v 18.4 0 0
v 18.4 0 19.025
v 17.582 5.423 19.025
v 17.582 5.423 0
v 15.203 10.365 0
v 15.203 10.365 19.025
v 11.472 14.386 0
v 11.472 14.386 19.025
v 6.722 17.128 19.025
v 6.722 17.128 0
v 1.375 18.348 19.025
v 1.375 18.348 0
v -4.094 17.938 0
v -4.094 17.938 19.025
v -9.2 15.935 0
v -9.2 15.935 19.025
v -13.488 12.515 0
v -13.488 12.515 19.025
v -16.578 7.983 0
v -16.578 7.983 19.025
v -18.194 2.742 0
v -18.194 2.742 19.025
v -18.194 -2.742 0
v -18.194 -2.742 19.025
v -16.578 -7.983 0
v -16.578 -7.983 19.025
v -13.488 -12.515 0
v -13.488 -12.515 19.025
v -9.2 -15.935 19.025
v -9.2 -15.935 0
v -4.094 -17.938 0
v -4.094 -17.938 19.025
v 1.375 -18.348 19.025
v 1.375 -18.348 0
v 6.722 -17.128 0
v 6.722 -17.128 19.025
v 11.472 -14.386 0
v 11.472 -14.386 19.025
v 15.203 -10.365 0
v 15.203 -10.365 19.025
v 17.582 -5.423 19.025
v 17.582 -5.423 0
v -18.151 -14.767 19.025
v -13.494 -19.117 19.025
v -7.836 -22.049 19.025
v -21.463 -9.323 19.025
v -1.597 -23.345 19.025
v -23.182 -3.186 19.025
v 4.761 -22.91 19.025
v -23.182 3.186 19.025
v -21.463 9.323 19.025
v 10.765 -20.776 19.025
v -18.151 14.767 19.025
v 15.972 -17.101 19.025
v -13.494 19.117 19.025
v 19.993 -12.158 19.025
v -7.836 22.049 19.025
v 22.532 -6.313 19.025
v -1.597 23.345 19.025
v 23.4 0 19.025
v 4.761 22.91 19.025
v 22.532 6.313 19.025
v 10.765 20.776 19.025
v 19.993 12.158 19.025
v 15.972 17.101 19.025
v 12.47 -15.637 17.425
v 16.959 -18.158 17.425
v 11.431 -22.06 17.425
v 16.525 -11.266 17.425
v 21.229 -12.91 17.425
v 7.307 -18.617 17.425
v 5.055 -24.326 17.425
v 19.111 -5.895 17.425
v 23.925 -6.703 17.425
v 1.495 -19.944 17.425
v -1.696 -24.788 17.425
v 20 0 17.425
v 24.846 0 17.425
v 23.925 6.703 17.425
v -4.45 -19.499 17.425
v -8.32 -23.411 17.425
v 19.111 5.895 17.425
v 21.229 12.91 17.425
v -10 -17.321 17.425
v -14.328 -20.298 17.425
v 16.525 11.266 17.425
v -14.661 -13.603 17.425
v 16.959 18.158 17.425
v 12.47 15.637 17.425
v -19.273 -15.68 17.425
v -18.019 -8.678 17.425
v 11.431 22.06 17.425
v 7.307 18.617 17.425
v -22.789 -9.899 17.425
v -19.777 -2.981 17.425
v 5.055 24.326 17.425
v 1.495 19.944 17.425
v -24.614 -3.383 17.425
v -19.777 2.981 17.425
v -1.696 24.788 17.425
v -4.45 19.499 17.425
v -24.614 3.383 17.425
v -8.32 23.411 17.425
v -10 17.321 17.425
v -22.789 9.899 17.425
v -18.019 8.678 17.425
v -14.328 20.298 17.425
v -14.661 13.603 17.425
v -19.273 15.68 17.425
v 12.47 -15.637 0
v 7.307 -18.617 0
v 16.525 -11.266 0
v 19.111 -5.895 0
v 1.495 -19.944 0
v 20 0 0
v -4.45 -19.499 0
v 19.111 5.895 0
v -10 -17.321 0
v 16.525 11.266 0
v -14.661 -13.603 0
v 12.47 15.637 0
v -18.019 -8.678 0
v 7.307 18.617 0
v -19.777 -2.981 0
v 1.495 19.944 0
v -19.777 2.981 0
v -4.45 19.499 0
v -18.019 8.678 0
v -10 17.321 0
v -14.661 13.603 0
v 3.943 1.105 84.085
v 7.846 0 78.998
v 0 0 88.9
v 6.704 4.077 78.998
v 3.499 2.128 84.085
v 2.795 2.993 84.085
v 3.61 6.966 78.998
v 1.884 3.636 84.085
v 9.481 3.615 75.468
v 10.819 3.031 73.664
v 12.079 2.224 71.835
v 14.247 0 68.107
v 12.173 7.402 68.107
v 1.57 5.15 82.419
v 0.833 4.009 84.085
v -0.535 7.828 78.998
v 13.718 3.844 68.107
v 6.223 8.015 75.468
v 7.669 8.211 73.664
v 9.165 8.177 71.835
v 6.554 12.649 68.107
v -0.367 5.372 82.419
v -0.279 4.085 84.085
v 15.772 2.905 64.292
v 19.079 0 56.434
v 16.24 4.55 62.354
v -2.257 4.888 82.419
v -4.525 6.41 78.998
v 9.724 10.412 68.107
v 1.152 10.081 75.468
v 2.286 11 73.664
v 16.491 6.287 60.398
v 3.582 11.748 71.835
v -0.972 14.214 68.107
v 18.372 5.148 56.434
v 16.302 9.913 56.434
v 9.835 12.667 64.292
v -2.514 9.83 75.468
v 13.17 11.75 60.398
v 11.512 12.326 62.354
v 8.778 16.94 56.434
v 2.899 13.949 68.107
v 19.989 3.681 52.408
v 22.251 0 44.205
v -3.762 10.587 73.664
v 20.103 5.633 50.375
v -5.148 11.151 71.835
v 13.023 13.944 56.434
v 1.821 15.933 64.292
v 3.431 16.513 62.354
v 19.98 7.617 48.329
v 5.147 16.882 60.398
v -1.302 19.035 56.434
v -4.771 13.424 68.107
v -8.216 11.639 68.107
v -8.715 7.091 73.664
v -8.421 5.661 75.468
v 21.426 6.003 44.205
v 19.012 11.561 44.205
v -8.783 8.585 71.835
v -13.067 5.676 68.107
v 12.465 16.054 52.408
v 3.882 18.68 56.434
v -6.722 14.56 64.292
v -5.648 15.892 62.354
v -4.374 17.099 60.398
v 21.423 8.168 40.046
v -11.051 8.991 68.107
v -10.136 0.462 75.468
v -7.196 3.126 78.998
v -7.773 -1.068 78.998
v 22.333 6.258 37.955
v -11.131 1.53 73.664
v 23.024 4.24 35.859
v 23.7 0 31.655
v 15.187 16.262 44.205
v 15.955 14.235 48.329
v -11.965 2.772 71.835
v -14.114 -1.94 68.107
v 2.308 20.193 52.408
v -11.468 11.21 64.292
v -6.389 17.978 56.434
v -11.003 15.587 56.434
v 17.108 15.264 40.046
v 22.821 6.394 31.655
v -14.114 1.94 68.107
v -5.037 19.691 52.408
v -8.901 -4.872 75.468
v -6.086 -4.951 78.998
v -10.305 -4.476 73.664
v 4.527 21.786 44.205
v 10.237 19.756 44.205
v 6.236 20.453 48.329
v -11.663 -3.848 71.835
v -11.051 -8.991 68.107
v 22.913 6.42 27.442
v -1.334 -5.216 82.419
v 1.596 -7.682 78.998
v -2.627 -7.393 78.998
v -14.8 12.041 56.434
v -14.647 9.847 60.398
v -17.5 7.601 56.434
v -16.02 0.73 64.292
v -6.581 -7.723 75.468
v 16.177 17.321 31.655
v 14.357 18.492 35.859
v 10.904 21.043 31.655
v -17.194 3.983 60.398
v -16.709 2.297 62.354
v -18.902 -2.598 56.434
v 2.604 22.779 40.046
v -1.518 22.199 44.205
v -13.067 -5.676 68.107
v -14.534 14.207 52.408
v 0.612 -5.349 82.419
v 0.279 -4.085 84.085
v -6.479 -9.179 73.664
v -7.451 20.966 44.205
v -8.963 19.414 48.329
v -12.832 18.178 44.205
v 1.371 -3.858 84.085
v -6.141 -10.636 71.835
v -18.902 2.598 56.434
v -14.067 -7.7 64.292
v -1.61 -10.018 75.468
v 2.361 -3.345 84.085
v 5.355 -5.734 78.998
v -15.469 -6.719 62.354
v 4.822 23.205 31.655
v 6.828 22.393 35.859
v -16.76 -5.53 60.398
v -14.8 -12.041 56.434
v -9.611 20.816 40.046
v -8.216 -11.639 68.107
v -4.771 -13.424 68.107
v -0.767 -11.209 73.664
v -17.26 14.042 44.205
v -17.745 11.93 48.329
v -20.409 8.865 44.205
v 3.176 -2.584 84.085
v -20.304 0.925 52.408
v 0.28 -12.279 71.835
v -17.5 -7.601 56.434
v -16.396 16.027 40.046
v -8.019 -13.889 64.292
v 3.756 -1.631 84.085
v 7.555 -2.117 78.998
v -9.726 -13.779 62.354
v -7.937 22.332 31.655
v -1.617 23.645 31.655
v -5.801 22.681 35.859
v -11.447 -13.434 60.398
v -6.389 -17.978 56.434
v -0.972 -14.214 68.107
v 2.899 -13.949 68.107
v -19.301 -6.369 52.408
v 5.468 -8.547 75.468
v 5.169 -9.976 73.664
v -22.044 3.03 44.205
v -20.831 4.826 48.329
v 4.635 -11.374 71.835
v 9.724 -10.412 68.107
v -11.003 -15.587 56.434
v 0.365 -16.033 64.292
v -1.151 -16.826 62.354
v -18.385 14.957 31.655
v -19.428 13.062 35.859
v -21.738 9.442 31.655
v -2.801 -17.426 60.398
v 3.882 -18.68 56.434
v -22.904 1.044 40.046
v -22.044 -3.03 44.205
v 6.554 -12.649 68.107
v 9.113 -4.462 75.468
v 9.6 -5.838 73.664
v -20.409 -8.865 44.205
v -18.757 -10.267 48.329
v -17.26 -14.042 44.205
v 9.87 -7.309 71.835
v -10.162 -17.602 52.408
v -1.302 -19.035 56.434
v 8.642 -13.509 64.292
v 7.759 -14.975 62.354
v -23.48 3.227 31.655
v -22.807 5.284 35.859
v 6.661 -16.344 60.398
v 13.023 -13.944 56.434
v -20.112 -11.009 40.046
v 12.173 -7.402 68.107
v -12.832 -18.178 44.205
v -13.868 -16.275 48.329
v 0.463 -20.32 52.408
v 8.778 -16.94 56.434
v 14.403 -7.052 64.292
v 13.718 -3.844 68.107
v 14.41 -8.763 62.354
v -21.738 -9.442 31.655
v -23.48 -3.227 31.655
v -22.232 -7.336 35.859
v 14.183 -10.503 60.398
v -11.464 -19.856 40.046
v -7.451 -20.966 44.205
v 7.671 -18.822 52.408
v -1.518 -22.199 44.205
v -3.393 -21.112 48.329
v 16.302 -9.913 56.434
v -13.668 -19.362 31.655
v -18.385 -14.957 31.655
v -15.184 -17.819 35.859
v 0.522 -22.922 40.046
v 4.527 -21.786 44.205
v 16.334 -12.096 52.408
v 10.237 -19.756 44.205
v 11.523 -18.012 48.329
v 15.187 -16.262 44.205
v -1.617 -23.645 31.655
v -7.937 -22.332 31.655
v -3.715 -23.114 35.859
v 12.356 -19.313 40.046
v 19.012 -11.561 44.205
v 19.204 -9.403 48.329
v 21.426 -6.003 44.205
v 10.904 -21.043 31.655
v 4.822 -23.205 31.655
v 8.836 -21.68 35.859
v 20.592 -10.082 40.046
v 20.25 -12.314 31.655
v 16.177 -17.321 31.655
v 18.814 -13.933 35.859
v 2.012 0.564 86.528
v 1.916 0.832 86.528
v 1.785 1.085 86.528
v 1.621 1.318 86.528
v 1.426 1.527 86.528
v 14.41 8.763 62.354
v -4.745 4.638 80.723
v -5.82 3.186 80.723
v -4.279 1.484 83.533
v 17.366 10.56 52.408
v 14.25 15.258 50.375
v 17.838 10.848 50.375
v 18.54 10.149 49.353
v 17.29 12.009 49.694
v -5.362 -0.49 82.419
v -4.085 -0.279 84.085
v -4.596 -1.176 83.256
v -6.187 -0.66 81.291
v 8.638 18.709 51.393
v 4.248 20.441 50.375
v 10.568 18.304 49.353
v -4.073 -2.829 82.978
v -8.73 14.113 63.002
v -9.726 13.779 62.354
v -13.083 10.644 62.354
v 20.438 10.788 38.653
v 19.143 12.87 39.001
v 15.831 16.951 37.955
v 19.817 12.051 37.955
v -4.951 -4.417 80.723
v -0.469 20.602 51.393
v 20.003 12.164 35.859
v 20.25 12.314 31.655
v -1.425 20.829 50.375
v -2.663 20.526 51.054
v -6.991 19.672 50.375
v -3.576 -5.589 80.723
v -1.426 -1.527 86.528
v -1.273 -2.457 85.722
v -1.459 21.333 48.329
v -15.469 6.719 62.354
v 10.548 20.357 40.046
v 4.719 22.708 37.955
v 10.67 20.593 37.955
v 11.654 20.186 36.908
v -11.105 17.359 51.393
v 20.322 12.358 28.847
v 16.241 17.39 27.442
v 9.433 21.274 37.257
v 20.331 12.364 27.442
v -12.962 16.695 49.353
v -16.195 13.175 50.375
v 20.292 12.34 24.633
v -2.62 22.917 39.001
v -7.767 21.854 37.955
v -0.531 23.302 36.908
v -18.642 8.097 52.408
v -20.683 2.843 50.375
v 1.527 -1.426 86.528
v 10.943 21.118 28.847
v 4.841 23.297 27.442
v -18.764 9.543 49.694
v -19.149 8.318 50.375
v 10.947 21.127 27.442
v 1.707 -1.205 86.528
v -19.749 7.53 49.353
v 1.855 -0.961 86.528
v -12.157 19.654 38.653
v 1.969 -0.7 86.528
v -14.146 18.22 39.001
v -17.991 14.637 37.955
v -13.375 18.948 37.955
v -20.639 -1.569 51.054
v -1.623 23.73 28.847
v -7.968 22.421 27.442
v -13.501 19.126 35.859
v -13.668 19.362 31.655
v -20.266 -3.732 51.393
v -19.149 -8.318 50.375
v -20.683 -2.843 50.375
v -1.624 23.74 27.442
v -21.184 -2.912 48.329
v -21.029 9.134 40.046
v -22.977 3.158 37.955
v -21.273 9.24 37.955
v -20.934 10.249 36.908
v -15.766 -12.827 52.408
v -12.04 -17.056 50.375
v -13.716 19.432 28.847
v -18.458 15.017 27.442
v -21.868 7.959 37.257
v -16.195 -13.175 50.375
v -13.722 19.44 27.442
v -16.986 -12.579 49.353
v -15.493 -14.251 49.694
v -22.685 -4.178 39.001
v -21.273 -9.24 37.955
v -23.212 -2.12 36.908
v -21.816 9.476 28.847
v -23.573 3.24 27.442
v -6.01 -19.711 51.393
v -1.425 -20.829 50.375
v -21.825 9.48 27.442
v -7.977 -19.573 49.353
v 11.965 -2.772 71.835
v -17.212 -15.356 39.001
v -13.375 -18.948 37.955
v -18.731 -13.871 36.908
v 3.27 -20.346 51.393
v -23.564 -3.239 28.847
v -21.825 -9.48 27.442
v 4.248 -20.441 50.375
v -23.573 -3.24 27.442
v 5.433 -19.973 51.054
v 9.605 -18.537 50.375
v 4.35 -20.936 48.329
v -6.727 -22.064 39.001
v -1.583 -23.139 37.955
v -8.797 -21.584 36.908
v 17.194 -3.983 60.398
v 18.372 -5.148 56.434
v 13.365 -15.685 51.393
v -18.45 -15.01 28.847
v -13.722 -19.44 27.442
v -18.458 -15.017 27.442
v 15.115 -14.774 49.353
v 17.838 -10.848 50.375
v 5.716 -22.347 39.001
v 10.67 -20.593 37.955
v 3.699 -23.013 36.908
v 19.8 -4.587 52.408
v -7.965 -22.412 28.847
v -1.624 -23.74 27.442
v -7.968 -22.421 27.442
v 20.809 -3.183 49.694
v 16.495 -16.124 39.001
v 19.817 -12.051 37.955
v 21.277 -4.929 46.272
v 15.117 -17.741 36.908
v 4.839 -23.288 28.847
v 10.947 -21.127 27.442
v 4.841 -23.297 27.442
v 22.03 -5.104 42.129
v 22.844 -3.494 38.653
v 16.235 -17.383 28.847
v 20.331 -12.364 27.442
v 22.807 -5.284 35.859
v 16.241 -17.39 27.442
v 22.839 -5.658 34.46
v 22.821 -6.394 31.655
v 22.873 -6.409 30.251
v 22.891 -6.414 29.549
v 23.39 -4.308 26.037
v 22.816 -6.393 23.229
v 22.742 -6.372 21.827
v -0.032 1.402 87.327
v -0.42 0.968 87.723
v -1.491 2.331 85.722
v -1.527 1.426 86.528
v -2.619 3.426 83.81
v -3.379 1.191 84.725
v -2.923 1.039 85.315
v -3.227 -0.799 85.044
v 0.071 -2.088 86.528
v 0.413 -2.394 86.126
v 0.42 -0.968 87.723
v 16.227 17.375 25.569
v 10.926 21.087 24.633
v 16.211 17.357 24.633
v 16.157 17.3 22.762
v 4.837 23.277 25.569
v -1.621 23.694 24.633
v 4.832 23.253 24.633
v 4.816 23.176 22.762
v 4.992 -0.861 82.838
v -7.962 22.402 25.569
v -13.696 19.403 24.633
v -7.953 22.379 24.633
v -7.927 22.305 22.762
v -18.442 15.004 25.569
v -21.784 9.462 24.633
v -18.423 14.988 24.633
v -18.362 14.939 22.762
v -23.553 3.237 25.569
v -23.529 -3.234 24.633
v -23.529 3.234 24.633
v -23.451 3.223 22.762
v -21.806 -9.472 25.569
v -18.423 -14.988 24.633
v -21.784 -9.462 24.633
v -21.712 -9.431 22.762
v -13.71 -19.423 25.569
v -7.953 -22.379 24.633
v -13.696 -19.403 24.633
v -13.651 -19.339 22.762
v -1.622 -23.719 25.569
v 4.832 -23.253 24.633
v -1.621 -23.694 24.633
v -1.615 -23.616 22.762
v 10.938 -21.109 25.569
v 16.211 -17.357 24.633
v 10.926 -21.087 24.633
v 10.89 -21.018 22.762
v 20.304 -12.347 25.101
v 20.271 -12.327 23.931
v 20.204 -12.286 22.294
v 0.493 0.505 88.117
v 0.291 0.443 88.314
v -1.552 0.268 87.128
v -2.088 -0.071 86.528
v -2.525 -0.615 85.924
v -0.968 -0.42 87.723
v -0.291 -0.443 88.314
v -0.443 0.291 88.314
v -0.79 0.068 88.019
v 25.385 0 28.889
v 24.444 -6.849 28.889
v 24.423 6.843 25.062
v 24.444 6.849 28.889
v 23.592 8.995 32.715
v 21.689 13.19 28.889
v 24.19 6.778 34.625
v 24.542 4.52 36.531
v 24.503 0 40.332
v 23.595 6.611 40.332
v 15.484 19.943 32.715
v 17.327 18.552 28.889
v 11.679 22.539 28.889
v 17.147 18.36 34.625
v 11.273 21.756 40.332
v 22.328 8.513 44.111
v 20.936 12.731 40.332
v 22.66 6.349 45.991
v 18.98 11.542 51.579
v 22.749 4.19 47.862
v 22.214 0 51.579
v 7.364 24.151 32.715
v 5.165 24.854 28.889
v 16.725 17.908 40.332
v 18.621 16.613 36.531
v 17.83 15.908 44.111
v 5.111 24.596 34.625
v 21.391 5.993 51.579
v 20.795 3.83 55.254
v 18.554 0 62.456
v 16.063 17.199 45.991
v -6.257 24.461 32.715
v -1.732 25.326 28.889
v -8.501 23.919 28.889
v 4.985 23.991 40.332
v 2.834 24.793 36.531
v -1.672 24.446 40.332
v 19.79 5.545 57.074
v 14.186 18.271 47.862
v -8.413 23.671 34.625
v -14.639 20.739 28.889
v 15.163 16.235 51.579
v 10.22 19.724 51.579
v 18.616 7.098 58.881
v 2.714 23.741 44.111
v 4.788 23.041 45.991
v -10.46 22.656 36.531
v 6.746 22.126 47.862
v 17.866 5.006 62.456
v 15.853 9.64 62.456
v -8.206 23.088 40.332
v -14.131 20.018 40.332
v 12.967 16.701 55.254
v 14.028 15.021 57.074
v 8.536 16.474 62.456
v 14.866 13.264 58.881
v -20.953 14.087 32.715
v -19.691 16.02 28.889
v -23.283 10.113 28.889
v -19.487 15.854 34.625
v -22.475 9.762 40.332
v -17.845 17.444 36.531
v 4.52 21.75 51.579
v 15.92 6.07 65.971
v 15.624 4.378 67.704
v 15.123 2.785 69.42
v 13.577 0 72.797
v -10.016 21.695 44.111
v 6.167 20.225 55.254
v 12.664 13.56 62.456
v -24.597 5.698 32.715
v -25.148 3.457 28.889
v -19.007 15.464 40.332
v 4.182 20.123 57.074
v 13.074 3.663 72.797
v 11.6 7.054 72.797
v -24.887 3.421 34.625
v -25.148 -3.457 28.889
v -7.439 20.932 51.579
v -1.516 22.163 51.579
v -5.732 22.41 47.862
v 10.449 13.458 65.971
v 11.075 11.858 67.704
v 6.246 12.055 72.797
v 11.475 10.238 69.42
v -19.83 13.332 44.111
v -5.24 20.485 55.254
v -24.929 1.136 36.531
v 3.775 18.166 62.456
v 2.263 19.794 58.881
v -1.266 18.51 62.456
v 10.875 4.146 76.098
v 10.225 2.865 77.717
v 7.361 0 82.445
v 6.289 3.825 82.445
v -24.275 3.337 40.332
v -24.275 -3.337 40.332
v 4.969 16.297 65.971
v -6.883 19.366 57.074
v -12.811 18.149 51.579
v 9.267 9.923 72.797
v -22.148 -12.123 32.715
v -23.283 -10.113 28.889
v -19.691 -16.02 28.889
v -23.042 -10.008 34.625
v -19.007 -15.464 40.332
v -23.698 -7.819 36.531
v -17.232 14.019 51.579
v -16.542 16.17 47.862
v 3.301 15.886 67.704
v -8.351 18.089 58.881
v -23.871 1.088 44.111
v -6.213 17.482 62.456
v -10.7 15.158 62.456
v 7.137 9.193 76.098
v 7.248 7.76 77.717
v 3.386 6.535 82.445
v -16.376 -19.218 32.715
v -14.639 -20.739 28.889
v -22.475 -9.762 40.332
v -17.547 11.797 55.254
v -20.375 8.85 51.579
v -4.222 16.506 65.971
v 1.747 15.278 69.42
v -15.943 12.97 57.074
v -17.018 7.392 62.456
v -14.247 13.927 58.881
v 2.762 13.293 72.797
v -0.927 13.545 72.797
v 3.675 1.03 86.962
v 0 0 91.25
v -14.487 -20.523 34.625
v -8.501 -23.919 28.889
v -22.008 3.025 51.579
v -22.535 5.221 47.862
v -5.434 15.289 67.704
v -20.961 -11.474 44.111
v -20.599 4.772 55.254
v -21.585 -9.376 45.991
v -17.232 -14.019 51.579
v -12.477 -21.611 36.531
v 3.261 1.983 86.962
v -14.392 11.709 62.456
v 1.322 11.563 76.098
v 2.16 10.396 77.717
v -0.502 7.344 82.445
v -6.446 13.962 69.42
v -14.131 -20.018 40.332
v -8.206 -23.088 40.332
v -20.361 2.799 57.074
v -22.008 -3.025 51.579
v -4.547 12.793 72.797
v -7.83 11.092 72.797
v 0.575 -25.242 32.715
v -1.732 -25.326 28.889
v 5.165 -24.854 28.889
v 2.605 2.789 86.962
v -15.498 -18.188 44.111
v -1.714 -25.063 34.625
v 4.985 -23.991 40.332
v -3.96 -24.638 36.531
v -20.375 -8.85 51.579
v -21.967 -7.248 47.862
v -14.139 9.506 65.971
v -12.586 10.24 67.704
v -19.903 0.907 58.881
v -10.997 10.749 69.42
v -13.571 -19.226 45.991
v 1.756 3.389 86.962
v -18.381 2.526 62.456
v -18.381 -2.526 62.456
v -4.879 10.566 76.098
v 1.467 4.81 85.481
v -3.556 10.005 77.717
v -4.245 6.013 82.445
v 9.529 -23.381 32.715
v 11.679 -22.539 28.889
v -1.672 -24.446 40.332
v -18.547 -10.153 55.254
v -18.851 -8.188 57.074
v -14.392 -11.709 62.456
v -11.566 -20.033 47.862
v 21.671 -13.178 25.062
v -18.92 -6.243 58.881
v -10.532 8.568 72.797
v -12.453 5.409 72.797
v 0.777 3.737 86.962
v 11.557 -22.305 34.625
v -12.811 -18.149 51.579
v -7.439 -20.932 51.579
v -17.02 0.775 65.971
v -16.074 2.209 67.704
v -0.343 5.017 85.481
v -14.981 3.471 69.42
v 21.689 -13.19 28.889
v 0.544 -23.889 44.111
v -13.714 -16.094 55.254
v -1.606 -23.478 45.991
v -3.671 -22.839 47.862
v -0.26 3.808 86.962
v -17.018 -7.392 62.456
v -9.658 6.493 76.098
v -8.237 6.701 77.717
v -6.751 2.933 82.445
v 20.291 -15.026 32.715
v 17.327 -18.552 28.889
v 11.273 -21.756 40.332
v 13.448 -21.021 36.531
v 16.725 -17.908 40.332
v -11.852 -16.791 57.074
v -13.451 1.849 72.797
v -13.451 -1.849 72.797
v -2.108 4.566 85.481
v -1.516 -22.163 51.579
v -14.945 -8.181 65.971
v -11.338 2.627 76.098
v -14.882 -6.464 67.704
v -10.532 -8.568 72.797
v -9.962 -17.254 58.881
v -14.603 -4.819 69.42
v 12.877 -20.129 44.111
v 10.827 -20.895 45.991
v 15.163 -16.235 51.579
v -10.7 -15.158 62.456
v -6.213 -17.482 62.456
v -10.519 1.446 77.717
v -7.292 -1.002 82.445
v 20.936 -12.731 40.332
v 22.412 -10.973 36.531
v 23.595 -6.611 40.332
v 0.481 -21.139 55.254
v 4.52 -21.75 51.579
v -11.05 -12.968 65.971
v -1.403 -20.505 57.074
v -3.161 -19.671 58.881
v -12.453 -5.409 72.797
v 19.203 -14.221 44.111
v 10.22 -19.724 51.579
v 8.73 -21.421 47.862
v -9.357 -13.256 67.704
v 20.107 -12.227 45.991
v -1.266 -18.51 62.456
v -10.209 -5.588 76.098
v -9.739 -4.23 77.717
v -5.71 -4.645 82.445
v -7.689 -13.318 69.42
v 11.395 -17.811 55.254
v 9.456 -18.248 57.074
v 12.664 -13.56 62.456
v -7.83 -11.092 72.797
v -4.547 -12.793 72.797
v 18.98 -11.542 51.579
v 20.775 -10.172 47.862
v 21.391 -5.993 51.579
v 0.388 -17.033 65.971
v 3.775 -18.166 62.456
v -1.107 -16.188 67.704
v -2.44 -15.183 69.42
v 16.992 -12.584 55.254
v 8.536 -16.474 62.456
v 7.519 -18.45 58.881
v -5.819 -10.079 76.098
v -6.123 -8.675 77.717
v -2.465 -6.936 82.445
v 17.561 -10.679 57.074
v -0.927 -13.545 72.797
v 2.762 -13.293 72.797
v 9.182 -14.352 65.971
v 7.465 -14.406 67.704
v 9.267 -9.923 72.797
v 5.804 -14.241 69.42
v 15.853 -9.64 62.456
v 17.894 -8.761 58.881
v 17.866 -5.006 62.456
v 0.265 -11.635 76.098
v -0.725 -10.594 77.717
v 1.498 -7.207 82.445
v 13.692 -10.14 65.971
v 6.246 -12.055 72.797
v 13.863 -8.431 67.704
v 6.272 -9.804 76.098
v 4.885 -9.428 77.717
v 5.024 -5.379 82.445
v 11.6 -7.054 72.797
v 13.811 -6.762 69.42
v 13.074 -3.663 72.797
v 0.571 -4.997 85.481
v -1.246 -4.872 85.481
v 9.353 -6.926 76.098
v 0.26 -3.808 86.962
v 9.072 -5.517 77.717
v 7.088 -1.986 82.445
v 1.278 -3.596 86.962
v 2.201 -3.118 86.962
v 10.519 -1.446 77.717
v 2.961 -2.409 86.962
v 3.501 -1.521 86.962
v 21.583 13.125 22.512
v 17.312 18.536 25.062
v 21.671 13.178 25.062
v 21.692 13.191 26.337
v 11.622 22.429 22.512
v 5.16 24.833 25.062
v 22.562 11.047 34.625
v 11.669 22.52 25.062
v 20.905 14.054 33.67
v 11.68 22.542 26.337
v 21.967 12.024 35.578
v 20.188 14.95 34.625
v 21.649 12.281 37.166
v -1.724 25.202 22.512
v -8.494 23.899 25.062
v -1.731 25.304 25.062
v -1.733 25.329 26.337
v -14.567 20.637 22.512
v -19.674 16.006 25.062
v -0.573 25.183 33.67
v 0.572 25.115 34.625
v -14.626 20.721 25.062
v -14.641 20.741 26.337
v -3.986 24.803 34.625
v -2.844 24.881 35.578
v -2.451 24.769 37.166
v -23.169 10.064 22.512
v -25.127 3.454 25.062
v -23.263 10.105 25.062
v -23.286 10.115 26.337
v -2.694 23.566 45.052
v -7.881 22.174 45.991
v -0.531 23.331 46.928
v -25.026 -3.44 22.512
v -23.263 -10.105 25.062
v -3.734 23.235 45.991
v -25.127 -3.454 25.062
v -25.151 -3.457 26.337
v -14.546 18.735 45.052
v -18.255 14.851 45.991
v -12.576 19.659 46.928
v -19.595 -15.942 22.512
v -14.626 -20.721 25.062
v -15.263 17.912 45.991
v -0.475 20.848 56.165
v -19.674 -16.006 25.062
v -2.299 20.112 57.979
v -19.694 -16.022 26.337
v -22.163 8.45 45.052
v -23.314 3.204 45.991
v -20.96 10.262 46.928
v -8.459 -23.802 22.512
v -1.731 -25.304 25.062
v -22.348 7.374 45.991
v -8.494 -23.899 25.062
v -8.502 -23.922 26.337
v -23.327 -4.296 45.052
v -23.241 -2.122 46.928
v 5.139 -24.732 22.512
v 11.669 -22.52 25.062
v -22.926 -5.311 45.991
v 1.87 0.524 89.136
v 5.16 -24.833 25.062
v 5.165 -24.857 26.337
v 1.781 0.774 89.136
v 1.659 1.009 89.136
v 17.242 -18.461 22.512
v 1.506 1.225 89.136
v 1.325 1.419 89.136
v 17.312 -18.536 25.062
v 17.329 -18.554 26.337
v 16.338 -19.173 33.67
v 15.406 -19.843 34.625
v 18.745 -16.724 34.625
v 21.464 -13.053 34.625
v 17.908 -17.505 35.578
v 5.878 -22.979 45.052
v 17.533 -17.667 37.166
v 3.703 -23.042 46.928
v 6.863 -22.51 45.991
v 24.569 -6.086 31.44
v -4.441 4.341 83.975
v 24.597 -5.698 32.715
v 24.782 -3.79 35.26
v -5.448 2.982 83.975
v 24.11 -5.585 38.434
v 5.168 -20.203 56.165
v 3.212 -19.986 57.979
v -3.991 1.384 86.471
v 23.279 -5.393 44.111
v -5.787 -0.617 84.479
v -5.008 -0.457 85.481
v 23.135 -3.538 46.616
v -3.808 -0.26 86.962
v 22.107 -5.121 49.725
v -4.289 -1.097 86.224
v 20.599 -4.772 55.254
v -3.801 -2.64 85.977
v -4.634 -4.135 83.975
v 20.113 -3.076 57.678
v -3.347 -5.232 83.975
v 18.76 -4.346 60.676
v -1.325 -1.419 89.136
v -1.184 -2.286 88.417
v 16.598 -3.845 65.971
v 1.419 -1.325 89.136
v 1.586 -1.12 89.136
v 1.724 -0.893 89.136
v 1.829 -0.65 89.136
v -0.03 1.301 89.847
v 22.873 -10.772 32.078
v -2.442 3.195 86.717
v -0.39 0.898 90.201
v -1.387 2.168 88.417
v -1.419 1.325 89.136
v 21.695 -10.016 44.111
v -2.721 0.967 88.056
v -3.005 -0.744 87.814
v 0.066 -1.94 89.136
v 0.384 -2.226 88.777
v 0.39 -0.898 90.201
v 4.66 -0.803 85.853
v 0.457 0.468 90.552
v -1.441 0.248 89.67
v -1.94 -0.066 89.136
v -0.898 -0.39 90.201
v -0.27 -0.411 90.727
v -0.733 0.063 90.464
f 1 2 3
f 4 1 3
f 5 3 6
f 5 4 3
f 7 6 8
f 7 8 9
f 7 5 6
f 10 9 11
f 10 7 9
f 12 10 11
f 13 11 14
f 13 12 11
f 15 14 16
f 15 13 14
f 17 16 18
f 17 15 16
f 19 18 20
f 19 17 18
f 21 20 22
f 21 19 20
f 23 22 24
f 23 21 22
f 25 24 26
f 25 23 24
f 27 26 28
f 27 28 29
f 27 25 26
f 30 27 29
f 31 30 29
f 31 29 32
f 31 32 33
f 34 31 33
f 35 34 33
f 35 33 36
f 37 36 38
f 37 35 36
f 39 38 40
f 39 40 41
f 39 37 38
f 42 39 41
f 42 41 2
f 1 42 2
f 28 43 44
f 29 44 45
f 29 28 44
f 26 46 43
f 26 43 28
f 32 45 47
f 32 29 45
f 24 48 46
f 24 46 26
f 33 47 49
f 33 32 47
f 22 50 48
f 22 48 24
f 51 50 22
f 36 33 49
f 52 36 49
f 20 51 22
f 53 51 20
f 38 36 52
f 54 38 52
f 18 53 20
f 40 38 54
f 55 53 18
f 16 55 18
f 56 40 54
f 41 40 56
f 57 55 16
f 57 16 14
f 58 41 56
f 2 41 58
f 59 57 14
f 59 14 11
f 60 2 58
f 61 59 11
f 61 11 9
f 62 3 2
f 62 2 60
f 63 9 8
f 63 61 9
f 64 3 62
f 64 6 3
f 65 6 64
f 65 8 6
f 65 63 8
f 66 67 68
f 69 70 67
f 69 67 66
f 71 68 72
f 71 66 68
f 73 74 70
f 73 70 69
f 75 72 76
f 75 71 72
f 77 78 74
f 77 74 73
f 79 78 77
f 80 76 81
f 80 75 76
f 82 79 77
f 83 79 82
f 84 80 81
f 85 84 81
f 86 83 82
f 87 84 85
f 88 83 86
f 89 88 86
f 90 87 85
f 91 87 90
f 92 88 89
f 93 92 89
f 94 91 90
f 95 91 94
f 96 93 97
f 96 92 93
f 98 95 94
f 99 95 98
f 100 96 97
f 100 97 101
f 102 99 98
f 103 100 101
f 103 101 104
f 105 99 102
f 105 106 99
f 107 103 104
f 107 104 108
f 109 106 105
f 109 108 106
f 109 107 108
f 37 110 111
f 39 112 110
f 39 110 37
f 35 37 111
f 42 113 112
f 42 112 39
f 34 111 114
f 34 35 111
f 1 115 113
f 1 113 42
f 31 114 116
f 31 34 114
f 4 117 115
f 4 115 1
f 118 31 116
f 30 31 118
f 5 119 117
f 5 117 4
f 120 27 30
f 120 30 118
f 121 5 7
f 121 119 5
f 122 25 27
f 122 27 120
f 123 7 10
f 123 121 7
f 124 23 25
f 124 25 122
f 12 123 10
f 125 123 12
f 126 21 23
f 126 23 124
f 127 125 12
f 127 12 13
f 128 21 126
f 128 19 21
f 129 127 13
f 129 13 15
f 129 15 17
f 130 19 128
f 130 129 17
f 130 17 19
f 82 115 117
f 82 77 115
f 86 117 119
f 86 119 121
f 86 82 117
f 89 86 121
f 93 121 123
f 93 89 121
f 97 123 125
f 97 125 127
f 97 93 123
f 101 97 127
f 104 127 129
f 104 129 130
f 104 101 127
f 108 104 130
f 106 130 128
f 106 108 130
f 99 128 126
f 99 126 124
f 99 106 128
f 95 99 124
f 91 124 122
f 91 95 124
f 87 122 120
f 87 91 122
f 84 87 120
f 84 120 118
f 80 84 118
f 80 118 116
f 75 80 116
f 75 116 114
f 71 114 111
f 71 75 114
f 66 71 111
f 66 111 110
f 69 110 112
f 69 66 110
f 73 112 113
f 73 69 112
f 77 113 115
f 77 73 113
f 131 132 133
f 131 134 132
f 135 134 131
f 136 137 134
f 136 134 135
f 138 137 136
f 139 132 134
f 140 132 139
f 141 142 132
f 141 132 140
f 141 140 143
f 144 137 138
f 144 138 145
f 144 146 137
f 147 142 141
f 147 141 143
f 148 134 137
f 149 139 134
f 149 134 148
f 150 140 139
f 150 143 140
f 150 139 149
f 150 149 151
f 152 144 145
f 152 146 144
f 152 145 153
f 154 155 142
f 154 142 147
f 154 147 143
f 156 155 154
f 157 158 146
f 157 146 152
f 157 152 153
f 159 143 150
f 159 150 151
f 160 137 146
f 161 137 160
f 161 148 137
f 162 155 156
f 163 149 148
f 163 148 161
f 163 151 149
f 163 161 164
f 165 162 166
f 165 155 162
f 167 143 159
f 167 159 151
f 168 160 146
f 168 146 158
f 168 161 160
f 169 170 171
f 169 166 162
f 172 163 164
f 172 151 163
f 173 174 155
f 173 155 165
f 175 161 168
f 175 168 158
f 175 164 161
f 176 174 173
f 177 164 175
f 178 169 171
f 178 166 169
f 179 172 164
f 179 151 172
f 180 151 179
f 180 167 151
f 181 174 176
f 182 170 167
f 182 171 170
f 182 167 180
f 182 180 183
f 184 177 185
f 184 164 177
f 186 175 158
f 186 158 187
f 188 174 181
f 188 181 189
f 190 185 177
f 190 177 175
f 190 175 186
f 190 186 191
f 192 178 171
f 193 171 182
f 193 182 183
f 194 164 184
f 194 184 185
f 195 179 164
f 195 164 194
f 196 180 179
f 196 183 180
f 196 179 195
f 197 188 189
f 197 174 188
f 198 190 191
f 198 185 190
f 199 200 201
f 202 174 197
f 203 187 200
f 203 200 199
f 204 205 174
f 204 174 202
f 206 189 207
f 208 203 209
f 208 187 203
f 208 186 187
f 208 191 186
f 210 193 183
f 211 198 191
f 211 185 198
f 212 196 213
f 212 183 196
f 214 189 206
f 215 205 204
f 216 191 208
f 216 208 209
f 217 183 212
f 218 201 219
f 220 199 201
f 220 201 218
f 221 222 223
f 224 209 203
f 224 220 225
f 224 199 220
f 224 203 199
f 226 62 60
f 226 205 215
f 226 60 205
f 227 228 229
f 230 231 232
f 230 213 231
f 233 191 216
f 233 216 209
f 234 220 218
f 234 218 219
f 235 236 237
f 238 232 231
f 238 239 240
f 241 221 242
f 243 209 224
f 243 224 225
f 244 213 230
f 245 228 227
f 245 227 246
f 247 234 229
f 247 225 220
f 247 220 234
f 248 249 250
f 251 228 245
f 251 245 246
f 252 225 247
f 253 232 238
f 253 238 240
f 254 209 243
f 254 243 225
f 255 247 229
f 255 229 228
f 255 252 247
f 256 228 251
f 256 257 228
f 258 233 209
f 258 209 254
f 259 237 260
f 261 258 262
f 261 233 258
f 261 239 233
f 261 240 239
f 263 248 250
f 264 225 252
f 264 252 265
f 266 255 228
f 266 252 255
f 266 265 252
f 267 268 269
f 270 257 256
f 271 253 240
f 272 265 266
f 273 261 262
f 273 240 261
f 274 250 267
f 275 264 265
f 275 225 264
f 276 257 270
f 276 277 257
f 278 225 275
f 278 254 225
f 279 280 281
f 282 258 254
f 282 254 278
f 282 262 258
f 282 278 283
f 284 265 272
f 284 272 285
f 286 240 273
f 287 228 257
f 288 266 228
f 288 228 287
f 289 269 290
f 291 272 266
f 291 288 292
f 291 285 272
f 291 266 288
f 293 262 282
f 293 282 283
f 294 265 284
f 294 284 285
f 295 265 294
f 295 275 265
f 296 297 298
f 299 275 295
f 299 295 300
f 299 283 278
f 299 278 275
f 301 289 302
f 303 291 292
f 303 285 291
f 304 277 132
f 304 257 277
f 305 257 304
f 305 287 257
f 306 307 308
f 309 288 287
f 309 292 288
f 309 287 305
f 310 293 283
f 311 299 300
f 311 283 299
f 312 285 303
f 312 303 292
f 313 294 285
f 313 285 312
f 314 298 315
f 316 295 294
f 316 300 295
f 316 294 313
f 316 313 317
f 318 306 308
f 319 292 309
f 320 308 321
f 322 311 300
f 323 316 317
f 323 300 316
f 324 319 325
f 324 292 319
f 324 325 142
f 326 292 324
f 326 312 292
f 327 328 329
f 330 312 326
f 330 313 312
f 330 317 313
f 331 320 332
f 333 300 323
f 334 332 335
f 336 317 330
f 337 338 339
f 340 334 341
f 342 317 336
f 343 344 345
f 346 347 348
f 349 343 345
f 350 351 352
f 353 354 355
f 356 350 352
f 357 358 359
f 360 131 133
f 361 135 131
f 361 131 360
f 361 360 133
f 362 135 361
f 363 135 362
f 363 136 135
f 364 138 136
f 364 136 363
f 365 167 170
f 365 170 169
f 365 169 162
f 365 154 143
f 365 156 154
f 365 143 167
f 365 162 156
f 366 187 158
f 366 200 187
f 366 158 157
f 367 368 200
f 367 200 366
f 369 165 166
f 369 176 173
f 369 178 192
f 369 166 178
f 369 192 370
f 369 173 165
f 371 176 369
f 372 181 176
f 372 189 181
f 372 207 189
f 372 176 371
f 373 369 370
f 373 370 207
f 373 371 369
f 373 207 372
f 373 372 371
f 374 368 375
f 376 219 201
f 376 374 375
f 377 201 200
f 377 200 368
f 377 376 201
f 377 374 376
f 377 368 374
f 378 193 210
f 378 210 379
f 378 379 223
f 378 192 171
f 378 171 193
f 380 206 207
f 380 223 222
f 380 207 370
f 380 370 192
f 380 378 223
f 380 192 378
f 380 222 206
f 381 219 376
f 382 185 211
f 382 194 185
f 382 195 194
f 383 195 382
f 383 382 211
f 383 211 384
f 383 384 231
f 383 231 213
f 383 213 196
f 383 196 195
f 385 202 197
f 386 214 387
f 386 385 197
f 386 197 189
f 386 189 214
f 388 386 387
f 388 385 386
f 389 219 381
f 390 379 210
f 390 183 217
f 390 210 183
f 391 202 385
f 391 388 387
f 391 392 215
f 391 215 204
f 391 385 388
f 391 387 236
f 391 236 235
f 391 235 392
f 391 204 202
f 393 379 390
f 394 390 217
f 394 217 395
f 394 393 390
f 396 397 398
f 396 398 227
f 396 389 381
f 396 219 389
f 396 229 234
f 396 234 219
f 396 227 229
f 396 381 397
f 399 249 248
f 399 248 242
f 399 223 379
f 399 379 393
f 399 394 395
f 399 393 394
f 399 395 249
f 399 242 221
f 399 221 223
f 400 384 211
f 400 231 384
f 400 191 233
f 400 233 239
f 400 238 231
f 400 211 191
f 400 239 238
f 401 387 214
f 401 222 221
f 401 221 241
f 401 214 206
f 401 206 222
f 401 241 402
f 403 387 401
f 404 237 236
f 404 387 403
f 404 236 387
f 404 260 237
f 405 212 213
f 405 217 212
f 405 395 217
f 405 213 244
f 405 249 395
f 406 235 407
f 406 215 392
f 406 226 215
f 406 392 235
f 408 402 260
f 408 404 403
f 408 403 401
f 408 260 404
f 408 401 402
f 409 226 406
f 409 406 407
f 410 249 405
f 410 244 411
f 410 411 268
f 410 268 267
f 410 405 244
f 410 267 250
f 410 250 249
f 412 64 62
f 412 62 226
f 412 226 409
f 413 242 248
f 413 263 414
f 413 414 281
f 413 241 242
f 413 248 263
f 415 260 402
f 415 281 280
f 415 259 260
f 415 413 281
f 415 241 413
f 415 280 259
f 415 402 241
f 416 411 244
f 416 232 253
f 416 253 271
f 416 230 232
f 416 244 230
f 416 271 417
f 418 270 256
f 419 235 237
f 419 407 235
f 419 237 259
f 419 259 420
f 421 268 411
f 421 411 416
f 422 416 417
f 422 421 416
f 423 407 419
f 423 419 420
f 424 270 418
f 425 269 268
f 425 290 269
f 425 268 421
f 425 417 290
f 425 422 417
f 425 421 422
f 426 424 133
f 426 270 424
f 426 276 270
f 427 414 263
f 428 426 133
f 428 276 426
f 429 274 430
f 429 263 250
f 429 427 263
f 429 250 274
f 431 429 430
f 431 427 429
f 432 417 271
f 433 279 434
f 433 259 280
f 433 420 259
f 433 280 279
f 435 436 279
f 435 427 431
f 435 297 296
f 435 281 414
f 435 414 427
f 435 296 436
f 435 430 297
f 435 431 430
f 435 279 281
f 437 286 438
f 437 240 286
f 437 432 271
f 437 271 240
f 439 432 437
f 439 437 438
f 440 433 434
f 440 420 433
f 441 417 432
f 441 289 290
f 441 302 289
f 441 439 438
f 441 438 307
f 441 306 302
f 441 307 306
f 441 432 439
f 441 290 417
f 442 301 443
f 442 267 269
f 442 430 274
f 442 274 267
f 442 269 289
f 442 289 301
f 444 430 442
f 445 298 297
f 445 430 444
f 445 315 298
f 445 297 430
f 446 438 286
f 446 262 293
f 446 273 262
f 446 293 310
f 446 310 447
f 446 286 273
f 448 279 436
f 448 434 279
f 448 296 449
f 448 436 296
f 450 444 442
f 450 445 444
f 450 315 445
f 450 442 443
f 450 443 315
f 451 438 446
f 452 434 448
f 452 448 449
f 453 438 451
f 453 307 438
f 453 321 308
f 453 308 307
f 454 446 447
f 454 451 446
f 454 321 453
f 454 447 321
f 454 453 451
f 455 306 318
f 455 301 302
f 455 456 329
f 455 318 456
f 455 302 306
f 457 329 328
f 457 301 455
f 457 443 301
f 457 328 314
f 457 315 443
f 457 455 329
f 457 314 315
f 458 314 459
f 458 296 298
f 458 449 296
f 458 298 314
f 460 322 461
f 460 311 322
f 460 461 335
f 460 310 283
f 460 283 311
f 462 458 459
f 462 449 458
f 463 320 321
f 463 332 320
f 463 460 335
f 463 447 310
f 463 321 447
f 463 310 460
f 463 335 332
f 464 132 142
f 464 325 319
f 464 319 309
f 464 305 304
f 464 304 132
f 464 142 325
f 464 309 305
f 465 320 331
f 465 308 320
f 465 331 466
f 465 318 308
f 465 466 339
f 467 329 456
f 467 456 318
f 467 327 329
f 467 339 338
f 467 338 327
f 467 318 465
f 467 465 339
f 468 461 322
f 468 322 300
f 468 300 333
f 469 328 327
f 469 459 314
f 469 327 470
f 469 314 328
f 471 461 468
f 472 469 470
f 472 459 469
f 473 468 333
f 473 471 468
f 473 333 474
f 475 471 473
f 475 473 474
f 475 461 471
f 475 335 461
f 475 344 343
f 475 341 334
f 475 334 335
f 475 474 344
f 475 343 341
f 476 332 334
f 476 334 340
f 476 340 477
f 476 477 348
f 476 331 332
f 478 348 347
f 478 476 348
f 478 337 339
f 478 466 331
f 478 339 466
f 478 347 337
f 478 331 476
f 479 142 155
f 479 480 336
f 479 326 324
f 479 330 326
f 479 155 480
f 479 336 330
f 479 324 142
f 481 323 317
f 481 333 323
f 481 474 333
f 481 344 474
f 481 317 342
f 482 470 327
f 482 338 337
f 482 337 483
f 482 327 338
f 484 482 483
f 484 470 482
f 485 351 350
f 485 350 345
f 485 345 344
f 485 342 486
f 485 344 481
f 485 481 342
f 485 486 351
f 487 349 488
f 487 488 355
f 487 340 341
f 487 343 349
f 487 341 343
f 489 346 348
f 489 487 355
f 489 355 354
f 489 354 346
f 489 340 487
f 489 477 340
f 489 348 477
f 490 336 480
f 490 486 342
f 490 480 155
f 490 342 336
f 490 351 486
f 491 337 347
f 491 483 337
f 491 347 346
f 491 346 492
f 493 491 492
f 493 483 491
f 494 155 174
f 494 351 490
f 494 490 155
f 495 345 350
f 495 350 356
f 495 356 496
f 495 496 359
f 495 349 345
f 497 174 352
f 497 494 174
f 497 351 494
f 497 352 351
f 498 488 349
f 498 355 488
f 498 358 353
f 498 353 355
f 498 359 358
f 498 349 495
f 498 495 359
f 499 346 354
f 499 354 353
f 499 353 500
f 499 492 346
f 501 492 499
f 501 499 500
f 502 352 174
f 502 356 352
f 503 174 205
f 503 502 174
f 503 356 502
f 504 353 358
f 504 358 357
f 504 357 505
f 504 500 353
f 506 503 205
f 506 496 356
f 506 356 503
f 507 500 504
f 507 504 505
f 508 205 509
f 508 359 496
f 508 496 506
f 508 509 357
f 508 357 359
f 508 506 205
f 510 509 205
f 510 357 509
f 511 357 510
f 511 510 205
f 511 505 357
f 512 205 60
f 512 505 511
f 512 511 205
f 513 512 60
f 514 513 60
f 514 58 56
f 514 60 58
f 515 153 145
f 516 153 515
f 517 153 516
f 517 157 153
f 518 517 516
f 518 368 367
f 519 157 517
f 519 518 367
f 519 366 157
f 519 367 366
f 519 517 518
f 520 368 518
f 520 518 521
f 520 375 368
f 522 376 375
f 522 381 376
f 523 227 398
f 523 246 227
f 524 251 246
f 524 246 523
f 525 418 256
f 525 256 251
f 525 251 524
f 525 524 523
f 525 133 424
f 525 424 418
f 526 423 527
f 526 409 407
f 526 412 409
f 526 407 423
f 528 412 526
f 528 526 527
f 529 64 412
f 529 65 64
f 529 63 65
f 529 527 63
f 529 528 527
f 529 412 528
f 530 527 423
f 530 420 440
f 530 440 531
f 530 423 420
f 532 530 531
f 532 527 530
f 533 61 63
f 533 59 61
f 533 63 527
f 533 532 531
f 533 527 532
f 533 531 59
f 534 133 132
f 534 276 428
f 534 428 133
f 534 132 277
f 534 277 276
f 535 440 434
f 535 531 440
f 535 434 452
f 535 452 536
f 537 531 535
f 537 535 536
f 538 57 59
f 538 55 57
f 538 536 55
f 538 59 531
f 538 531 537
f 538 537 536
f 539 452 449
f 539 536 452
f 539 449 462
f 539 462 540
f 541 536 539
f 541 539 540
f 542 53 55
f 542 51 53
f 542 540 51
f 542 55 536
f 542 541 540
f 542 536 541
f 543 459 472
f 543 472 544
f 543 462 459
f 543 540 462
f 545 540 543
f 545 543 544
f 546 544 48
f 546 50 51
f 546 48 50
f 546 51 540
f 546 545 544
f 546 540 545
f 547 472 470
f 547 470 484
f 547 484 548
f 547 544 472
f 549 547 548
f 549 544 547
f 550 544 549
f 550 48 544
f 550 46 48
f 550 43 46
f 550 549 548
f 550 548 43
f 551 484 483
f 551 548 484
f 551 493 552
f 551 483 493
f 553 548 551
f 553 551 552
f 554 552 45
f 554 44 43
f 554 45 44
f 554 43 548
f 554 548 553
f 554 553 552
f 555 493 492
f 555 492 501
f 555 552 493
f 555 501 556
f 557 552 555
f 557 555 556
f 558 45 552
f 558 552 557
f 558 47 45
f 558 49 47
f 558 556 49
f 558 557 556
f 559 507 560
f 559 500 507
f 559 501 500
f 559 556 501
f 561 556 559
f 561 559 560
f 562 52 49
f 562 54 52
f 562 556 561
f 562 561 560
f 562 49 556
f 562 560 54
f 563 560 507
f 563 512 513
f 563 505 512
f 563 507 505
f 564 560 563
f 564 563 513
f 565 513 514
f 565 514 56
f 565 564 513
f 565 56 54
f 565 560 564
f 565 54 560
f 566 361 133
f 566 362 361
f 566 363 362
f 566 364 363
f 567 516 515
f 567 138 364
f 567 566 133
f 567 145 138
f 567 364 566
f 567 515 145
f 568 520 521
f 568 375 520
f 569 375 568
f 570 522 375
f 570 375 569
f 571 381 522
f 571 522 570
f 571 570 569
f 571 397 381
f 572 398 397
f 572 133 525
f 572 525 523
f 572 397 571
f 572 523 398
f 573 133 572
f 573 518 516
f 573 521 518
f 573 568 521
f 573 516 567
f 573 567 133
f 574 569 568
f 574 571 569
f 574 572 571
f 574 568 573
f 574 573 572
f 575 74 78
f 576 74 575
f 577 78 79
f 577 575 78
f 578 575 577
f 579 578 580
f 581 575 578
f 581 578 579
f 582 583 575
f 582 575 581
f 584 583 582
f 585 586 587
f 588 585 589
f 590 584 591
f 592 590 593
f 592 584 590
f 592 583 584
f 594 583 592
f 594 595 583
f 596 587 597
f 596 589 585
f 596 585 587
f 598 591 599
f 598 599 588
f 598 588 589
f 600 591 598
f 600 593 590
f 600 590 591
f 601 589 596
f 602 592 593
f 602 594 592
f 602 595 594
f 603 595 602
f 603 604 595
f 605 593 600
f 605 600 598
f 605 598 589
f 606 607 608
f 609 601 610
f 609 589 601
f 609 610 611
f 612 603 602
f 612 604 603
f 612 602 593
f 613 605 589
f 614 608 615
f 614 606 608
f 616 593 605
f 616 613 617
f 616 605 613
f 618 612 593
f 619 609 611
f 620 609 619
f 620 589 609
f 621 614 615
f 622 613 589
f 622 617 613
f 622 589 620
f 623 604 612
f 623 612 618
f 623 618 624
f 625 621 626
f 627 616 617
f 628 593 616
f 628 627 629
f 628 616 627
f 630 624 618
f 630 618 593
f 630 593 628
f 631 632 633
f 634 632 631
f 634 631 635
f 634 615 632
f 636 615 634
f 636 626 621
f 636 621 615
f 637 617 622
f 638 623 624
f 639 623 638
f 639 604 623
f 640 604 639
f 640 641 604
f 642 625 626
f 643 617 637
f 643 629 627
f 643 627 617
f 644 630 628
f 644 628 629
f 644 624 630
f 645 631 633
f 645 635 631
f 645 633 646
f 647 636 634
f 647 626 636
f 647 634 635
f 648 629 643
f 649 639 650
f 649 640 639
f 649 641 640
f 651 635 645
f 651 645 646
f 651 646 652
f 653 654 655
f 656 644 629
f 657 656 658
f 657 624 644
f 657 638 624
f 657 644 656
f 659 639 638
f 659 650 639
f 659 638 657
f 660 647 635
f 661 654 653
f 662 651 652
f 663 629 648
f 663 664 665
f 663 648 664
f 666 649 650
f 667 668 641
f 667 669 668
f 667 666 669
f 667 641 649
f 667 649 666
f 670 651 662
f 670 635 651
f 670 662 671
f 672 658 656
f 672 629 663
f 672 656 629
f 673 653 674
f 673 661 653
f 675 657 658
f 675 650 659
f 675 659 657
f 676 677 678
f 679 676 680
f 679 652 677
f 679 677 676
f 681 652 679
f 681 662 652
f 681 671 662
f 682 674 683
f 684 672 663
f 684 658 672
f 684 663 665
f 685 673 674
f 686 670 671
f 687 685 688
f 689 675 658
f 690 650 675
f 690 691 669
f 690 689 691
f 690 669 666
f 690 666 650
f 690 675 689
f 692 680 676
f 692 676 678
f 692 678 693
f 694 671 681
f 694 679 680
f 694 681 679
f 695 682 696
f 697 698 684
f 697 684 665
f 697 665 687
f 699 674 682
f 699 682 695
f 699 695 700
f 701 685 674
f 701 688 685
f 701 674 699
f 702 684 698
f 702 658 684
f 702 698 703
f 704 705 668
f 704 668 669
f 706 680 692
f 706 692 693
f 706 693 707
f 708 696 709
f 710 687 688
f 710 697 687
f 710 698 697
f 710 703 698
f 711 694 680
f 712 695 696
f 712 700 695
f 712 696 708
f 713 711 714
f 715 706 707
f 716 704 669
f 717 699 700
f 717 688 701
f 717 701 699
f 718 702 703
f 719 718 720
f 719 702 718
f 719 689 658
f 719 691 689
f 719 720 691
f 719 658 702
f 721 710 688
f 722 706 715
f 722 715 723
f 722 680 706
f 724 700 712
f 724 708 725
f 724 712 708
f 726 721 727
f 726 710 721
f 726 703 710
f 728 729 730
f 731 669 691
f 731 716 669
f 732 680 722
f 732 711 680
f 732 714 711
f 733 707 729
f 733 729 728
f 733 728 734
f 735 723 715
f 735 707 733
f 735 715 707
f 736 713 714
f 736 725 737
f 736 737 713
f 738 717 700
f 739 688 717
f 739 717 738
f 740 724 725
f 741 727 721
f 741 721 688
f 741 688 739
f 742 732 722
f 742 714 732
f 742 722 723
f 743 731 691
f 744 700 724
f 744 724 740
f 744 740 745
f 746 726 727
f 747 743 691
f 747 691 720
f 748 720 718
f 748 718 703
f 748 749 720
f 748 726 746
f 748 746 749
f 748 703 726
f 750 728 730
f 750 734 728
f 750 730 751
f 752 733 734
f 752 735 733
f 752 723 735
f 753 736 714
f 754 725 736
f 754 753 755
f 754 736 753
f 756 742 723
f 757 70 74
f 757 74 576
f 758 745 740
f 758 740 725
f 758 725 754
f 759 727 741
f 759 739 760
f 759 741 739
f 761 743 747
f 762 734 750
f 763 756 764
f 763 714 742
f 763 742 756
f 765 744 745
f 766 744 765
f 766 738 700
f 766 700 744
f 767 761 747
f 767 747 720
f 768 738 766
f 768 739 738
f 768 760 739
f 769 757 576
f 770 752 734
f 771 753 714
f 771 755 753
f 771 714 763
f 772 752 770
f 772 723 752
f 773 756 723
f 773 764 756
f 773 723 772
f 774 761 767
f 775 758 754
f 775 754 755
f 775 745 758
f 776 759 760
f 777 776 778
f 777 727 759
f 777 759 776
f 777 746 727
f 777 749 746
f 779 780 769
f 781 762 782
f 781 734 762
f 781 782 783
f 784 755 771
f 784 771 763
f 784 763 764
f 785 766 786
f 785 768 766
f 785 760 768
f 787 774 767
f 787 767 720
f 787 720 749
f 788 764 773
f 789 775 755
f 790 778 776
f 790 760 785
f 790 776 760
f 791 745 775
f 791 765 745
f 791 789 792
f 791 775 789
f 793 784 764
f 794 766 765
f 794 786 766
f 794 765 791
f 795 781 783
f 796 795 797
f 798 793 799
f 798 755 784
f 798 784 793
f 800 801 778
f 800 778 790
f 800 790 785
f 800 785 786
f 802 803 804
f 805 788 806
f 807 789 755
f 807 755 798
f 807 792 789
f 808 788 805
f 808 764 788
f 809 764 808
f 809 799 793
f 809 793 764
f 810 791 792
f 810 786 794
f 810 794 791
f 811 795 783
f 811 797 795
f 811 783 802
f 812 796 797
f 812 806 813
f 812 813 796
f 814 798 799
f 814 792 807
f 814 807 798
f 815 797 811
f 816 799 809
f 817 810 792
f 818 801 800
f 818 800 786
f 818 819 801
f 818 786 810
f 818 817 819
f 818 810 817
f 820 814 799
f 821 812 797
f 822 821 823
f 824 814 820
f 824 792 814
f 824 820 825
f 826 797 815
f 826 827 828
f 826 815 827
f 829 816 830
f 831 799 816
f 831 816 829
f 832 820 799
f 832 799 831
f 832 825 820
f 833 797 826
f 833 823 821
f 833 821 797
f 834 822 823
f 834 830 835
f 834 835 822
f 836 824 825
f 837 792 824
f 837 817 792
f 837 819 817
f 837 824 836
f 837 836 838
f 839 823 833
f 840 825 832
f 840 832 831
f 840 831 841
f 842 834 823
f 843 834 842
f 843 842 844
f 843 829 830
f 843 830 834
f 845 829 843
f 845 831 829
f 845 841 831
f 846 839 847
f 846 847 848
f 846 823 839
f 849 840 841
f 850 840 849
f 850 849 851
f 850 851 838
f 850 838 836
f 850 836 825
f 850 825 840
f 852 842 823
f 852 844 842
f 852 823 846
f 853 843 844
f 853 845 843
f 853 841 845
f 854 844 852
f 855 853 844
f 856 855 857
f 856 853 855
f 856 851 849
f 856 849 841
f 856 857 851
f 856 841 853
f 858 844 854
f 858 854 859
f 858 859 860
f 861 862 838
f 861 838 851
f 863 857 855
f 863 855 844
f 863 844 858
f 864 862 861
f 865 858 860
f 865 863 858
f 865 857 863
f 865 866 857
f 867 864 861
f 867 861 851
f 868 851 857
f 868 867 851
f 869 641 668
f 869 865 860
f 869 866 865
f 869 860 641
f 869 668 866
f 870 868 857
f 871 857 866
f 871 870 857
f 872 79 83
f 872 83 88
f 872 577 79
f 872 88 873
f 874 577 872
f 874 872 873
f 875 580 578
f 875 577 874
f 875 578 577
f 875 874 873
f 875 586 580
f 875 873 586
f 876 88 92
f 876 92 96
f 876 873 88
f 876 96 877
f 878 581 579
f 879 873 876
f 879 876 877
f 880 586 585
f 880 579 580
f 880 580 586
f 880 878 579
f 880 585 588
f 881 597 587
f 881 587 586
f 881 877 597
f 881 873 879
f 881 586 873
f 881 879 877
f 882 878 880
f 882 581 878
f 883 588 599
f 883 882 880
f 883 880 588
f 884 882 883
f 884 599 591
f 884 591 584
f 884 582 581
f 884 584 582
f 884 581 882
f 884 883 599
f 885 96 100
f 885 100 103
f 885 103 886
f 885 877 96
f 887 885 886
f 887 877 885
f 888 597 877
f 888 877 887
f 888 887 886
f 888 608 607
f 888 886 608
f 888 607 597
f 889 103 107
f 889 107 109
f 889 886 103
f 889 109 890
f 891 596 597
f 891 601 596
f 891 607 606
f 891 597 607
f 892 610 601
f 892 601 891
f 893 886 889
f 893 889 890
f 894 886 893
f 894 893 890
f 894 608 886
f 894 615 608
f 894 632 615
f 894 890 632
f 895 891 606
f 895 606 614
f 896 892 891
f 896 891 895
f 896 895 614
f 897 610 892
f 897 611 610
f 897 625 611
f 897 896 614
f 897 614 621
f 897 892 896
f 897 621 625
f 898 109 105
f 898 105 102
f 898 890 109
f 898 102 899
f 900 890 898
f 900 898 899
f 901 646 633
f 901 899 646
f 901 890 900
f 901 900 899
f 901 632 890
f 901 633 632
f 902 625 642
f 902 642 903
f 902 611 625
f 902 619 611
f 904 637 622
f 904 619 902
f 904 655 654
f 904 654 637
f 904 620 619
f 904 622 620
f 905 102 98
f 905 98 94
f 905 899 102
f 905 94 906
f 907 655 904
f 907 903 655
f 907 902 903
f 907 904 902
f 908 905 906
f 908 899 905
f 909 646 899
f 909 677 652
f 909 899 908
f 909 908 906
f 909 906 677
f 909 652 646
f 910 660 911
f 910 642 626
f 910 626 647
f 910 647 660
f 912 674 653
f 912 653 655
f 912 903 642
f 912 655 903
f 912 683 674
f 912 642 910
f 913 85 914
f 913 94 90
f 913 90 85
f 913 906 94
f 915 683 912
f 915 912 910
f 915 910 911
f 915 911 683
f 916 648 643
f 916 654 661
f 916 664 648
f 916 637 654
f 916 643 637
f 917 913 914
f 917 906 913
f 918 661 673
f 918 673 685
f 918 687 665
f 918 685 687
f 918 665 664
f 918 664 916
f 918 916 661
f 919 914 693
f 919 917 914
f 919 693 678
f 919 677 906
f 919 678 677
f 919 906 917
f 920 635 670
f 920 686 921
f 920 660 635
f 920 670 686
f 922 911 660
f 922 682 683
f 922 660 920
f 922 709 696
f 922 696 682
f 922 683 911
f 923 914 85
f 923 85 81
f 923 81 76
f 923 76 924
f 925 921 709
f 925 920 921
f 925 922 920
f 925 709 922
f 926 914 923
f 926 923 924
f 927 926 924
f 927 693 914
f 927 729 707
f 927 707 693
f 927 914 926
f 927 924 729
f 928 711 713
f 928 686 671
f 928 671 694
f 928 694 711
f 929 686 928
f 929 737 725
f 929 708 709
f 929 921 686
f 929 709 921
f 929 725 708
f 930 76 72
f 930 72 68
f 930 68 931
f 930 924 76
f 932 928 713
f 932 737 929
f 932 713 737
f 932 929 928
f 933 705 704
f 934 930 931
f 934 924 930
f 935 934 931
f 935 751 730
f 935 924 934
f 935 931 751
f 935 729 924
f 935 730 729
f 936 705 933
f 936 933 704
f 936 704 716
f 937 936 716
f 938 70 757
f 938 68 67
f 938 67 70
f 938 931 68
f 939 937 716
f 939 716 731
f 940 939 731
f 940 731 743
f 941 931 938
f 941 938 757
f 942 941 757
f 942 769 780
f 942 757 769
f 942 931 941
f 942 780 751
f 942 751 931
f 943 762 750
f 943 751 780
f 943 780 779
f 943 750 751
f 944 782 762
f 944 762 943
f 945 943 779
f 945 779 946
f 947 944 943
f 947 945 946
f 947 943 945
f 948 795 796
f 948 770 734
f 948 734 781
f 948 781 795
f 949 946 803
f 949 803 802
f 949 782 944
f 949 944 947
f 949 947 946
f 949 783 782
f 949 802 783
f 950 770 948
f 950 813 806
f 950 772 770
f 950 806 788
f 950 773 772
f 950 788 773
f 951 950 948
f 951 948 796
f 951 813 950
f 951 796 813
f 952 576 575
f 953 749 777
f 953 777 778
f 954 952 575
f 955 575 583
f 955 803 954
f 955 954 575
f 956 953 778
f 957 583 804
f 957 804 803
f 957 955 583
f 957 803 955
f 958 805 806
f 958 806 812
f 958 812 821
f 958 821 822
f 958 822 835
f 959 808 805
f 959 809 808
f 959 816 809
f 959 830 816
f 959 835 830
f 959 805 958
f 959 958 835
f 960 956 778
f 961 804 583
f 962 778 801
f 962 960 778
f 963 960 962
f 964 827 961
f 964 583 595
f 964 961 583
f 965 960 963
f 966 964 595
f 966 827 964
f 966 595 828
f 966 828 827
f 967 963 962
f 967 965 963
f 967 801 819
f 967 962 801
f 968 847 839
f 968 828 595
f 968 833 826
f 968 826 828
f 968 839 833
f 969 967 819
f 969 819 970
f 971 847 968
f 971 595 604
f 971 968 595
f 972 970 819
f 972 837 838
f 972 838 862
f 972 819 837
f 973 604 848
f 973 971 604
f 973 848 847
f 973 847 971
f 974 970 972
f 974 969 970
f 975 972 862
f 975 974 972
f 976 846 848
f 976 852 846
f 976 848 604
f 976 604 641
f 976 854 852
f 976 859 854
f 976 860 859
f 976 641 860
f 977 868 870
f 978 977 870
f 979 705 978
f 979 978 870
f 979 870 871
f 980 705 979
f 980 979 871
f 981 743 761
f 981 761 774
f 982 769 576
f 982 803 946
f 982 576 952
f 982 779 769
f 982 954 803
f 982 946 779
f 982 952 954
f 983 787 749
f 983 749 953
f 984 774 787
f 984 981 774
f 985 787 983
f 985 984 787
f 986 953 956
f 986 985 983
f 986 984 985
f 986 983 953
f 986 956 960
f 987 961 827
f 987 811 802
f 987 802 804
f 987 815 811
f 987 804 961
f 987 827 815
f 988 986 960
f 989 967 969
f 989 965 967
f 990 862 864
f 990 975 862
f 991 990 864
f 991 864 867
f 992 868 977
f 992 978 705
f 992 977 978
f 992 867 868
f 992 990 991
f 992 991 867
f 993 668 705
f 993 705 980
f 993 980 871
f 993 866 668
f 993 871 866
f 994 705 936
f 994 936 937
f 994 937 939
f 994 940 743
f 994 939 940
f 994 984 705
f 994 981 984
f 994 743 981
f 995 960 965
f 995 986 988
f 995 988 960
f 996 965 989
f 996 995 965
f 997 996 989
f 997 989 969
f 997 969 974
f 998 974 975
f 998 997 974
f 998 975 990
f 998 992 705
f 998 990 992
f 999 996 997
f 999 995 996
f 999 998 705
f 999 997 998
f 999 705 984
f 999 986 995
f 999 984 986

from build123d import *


with BuildPart() as f1:
    # F0 (on Front) → F1 (revolve)
    with BuildSketch(Plane.XZ):
        with BuildLine():
            Line((0, 91.250416), (0, 88.9))
            ThreePointArc((0, 88.9), (19.0794, 56.434019), (23.3998, 19.025495))
            Line((23.3998, 19.025495), (18.3998, 19.025495))
            Line((18.3998, 19.025495), (18.3998, 0))
            Line((18.3998, 0), (20, 0))
            Line((20, 0), (20, 17.425295))
            Line((20, 17.425295), (24.845907, 17.425295))
            ThreePointArc((24.845907, 17.425295), (20.552556, 57.073881), (0, 91.250416))
        make_face()
    revolve(axis=Axis((0, 0, 44.45), (0, 0, 1)))


solid = f1.part
